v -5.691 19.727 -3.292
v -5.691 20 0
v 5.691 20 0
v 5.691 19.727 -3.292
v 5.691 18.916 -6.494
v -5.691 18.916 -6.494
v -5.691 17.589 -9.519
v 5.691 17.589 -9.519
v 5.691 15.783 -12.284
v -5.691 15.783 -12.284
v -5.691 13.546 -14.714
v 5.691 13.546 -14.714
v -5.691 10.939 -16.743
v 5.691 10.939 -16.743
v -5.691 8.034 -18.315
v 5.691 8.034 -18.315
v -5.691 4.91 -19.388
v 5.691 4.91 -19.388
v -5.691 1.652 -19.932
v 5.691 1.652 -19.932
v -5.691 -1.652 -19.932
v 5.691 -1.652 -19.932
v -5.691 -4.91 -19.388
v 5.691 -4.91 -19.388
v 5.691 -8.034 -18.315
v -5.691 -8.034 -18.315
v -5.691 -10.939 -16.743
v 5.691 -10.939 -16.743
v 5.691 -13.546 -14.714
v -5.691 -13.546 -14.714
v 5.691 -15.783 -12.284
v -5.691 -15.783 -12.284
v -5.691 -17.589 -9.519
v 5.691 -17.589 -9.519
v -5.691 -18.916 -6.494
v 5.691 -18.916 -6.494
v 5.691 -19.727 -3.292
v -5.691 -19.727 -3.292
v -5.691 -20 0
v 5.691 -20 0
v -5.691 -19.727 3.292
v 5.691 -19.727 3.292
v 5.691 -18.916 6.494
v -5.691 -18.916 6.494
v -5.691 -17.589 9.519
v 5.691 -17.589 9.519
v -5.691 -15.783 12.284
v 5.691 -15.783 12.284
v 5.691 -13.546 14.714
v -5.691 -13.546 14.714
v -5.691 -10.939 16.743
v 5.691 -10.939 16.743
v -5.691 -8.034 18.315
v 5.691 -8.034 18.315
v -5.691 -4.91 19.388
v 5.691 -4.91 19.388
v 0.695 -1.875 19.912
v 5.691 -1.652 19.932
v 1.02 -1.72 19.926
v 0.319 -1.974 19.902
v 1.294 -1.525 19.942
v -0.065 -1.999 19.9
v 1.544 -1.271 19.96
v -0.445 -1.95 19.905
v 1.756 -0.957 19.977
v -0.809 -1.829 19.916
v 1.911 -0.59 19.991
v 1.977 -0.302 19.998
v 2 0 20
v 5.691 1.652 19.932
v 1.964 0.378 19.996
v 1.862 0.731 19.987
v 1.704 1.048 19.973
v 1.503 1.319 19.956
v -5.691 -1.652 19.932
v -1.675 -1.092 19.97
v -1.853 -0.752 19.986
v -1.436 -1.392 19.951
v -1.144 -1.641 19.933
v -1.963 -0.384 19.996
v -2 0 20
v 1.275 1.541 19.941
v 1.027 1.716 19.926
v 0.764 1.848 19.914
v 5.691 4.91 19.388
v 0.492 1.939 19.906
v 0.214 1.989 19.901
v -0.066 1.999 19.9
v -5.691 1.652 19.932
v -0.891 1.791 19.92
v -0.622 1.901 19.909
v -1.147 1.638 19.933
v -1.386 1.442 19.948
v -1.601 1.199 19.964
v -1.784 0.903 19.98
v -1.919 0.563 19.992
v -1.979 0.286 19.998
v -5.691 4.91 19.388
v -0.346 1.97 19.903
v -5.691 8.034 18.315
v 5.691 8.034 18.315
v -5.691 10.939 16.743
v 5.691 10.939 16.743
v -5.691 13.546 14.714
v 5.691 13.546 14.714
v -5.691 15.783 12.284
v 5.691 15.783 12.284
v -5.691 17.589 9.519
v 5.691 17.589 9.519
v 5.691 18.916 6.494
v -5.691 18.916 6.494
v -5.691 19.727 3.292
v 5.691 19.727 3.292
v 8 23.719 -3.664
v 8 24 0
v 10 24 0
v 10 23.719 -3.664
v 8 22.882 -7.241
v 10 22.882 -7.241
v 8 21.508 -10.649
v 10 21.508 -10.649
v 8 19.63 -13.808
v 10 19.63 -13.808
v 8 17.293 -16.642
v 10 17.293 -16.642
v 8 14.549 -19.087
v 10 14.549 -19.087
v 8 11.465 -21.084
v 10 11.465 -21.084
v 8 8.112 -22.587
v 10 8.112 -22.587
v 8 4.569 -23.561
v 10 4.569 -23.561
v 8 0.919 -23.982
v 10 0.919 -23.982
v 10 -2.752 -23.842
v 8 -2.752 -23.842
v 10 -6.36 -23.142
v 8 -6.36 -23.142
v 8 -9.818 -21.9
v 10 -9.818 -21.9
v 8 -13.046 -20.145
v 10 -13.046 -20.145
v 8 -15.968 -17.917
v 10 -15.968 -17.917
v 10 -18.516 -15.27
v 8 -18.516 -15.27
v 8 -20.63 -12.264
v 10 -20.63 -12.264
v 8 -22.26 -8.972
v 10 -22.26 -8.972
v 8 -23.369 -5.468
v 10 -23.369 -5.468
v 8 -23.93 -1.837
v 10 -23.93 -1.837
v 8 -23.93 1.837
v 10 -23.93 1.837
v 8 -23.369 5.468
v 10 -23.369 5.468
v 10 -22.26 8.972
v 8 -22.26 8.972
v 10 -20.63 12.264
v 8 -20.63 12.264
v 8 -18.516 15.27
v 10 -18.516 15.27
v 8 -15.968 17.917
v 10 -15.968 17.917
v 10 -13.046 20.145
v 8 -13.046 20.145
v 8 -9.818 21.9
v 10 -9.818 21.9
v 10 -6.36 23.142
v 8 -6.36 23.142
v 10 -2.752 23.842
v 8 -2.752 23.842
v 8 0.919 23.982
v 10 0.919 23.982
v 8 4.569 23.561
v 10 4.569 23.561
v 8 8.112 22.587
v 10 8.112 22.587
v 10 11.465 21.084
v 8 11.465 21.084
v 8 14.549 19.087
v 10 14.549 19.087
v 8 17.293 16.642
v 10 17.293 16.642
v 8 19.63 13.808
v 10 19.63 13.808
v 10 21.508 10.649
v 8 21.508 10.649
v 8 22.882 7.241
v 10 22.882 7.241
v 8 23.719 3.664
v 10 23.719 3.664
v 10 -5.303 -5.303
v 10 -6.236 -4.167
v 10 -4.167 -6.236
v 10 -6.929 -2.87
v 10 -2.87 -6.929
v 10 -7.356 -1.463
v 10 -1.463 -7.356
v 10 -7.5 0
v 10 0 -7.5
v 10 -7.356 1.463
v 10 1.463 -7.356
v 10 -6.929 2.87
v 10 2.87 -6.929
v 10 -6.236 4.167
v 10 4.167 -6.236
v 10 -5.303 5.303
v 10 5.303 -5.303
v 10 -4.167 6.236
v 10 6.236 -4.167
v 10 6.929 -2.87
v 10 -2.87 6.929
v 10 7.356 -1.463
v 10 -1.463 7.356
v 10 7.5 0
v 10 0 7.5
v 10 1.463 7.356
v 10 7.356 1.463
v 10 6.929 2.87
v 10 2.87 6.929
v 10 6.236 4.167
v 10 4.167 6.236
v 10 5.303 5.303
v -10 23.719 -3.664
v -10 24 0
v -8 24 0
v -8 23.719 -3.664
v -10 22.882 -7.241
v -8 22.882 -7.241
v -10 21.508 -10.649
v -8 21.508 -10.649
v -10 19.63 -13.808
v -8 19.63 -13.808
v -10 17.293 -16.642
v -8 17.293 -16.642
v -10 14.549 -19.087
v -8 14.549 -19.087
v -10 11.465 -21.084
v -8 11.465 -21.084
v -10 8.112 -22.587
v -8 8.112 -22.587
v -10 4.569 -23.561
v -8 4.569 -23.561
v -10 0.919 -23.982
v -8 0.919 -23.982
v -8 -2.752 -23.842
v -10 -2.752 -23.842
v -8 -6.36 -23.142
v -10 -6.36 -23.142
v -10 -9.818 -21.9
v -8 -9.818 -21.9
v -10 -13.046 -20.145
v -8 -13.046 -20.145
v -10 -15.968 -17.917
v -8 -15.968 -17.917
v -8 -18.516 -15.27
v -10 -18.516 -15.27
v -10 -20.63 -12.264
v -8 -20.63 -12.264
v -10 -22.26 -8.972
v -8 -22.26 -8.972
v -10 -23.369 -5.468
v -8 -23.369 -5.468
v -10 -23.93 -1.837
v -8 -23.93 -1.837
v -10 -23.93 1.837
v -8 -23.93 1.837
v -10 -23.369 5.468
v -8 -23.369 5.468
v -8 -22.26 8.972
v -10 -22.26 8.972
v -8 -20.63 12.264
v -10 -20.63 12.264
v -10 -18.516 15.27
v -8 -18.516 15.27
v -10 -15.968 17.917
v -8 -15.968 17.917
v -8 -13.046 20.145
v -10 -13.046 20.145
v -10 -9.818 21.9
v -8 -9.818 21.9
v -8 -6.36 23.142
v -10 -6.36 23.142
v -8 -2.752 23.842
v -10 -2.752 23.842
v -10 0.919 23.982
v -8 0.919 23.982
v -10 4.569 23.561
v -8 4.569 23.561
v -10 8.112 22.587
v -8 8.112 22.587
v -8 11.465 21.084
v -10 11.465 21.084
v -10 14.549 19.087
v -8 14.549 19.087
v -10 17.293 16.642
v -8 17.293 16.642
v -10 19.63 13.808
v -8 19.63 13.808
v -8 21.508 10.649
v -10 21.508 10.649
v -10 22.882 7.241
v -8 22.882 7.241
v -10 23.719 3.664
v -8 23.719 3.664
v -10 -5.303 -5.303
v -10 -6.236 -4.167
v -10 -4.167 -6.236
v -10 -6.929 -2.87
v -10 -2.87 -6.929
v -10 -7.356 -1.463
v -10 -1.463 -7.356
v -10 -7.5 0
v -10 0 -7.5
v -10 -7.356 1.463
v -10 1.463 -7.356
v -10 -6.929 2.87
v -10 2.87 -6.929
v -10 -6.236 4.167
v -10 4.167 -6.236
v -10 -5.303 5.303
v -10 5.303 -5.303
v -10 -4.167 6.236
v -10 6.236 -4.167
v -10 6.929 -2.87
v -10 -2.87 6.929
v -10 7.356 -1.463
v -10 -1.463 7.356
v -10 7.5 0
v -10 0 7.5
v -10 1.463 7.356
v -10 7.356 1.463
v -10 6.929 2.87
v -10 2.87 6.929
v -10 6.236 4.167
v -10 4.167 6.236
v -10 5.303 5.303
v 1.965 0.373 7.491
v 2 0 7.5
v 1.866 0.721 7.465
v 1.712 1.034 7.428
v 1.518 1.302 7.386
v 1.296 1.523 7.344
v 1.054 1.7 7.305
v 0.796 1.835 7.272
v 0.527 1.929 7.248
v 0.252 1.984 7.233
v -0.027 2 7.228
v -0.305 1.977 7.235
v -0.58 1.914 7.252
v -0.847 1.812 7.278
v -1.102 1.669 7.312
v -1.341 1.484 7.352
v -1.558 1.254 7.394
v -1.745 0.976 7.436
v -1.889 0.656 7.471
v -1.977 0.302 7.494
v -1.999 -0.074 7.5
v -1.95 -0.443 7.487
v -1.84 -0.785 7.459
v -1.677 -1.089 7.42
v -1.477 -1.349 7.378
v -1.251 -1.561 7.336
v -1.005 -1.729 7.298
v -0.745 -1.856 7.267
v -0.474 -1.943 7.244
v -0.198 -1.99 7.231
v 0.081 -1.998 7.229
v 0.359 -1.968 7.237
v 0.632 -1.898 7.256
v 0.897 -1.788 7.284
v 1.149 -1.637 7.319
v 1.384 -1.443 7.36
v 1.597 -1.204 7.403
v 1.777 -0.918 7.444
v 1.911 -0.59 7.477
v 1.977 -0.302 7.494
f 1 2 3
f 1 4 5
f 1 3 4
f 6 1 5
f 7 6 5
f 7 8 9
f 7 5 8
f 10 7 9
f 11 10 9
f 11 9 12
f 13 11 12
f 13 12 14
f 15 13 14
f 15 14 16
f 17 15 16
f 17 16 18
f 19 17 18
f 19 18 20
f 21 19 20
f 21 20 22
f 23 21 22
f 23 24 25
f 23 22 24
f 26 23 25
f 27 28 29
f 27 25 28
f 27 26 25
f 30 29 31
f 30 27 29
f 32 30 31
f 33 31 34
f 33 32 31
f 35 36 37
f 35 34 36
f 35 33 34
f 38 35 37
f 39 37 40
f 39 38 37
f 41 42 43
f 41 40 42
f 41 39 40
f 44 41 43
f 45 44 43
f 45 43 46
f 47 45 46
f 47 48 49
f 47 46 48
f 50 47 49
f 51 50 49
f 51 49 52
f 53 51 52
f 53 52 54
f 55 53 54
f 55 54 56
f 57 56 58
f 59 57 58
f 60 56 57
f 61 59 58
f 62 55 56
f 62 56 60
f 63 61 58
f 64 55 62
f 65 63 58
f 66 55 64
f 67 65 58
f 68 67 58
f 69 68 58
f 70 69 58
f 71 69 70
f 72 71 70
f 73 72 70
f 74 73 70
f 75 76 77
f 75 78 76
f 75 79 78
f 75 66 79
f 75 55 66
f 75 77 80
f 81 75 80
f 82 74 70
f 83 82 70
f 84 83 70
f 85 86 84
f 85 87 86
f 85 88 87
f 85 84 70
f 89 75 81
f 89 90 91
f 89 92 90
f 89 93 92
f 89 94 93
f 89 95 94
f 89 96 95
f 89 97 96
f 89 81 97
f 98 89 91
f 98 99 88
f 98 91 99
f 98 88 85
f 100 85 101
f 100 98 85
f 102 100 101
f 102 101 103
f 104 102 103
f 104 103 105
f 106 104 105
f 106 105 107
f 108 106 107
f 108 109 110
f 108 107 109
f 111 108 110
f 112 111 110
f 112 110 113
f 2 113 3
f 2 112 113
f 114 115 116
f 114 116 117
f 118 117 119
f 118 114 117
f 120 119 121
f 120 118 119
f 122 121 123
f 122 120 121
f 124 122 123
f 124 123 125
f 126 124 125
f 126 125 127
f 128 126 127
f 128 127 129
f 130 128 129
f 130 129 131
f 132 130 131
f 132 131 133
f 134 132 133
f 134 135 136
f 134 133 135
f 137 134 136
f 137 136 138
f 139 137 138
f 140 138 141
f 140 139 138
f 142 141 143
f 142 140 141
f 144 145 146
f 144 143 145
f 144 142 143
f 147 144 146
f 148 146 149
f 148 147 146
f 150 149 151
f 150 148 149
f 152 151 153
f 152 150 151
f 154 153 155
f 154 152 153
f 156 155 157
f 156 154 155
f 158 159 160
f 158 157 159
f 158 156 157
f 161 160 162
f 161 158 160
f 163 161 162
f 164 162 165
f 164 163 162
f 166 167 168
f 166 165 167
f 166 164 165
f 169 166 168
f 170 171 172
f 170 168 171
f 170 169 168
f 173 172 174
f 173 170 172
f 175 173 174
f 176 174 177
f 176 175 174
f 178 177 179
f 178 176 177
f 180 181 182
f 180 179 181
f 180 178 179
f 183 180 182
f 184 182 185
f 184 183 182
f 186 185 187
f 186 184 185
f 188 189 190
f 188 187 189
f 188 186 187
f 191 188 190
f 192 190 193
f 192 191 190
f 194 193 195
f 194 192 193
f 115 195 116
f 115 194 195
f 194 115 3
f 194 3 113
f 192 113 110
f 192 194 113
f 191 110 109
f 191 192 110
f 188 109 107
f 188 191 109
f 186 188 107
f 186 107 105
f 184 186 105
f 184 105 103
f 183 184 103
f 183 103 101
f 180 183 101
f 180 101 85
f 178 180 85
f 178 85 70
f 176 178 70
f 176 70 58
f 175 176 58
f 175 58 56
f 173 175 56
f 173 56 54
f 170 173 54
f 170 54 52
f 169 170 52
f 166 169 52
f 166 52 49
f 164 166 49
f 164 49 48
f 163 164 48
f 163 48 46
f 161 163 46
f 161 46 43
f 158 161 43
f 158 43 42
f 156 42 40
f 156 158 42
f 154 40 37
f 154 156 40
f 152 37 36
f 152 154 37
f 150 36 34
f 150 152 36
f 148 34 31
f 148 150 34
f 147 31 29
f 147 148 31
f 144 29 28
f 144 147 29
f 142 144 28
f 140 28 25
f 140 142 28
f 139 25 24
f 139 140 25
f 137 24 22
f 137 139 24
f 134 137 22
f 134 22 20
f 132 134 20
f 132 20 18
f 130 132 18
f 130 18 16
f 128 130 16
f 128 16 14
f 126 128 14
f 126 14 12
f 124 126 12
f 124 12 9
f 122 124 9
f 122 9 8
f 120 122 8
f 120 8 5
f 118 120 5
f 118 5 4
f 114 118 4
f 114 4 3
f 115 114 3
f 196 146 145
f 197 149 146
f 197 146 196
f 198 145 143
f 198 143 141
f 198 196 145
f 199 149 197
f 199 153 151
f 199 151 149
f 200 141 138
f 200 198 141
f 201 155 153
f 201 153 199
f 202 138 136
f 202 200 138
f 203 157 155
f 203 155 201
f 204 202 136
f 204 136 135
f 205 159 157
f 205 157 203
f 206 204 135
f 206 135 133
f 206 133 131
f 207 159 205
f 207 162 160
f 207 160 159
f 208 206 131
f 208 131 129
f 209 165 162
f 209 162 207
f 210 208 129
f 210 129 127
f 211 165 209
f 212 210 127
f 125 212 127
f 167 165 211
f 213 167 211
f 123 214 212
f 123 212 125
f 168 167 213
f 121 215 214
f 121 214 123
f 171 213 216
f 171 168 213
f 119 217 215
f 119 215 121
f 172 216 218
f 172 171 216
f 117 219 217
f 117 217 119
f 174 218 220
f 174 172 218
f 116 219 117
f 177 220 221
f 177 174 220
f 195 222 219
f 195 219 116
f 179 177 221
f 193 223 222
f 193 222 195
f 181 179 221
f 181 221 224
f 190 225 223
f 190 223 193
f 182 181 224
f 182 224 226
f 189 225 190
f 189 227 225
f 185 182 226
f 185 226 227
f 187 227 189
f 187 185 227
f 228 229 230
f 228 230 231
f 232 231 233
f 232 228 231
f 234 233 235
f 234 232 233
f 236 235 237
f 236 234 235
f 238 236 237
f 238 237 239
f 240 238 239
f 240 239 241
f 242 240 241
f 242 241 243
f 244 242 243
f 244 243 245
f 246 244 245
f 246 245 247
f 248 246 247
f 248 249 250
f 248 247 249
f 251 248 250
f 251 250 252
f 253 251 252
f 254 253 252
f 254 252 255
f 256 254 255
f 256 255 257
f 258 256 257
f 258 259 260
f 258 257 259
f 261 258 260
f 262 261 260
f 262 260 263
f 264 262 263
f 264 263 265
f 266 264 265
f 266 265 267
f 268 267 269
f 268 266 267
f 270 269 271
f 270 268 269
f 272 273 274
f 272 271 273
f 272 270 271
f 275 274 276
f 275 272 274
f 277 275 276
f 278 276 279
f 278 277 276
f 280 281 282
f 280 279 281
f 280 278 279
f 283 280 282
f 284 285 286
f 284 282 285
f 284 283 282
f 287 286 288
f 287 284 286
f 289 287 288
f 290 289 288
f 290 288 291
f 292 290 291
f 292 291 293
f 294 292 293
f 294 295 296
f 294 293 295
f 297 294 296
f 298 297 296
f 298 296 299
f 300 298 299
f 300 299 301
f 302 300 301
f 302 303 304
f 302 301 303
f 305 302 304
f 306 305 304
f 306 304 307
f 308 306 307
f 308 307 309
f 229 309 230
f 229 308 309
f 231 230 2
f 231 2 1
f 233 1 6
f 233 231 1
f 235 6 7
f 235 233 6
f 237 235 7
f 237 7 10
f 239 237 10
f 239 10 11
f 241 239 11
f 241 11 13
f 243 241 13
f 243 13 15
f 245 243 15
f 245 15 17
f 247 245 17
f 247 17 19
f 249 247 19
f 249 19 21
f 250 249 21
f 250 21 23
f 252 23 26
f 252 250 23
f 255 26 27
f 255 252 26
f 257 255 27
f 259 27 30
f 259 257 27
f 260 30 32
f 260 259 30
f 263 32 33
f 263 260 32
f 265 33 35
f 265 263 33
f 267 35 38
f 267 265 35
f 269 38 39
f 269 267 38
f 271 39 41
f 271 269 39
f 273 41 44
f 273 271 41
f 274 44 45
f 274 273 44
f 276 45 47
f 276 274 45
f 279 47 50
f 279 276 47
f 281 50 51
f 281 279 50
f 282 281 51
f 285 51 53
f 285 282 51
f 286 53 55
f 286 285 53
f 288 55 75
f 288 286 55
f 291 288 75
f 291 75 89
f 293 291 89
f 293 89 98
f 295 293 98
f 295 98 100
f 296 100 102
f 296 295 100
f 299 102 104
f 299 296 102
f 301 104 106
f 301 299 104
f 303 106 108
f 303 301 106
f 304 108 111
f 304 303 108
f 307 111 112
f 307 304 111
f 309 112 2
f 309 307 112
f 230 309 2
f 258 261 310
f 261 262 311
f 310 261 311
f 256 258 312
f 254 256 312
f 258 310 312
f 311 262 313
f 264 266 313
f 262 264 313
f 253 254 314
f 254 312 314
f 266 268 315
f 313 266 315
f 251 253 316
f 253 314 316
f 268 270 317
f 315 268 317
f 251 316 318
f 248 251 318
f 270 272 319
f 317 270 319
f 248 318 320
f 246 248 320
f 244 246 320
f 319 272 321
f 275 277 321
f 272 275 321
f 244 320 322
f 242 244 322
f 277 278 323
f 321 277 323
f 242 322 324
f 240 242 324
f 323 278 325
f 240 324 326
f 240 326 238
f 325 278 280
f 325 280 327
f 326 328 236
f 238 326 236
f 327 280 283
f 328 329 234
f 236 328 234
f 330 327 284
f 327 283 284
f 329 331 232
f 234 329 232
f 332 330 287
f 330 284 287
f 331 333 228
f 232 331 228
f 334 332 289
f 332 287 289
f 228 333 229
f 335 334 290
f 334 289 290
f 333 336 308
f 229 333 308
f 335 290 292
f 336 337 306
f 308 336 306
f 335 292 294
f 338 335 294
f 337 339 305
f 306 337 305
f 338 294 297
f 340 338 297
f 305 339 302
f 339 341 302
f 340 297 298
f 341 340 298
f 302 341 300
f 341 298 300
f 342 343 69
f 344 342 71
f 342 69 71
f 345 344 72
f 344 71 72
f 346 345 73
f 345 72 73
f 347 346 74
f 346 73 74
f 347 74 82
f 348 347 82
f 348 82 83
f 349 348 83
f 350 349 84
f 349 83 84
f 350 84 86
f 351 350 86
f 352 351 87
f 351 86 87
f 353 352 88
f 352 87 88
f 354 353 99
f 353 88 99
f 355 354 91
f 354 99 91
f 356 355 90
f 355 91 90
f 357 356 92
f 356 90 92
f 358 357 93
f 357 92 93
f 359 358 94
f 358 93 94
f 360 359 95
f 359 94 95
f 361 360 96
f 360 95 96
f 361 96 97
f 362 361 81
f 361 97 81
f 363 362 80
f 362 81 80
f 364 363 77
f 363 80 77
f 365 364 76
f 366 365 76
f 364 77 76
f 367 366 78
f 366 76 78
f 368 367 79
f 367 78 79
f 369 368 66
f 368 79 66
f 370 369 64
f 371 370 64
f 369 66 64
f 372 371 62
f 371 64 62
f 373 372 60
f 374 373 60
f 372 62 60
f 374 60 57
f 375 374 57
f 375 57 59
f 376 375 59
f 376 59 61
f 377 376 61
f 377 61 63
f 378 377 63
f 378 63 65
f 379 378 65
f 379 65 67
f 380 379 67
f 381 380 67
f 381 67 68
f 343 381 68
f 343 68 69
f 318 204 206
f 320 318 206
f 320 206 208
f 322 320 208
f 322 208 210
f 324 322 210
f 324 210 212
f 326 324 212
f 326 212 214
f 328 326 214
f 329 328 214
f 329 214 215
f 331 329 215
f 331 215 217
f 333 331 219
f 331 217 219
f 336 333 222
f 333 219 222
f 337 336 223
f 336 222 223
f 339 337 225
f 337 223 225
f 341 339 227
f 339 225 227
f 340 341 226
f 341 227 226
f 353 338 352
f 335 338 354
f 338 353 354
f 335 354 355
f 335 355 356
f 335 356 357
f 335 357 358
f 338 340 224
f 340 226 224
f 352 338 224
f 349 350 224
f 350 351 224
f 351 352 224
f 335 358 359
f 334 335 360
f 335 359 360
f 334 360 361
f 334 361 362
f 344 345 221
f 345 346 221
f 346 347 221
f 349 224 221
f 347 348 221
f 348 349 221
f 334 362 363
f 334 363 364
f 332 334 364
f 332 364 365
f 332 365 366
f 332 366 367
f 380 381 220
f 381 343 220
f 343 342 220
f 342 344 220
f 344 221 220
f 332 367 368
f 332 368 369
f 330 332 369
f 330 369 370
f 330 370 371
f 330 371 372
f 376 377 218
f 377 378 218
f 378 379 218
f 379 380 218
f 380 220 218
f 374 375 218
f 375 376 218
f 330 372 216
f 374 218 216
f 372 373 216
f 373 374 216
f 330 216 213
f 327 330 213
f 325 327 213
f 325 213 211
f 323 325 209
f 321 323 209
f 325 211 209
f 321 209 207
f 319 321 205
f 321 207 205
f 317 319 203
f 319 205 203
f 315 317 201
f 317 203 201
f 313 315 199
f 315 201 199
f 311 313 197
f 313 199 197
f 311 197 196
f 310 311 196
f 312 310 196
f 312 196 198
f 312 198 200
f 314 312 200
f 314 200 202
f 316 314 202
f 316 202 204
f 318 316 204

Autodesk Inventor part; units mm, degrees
ref_plane "YZ Plane" through (0, 0, 0) normal (1, 0, 0) x (0, 1, 0)
ref_plane "XZ Plane" through (0, 0, 0) normal (0, 1, 0) x (-1, 0, 0)
sketch "草图1" plane through (0, 0, 0) normal (0, 0, 1) x (1, 0, 0)
  line L0 (-10, 0) -> (10, 0)
  line L1 (10, 0) -> (10, 24)
  line L2 (10, 24) -> (8, 24)
  line L3 (8, 24) -> (5.6906, 20)
  line L4 (5.6906, 20) -> (-5.6906, 20)
  line L5 (-5.6906, 20) -> (-8, 24)
  line L6 (-8, 24) -> (-10, 24)
  line L7 (-10, 24) -> (-10, 0)
  line L8 (-14, 0) -> (14, 0) projected
  point P0 (0, 0)
  point P1 (0, 0)
  dimension "d1" = 24
  dimension "d2" = 4
  dimension "d4" = 20
  dimension "d5" = 2
  dimension "d6" = 120
  dimension "d7" = 120
  dimension "d8" = 2
revolve "旋转1" add sketch "草图1" angle 360 about axis through (-10, 0, 0) along (1, 0, 0)
sketch "草图2" plane through (10, 0, 0) normal (1, 0, 0) x (0, 0, -1)
  circle A0 centre (0, 0) radius 7.5
  dimension "d10" = 15
extrude "拉伸1" cut sketch "草图2" against normal through all
ref_plane "工作平面1" through (0, 0, 20) normal (0, 0, 1) x (1, 0, 0)
sketch "草图3" plane through (0, 0, 20) normal (0, 0, 1) x (1, 0, 0)
  circle A0 centre (0, 0) radius 2
  dimension "d13" = 4
extrude "拉伸2" cut sketch "草图3" against normal up to surface
thread "螺纹1" size "M4x0.7" class "6H" standard "ANSI Metric M Profile" full length
properties part number "砂轮电机皮带轮"
